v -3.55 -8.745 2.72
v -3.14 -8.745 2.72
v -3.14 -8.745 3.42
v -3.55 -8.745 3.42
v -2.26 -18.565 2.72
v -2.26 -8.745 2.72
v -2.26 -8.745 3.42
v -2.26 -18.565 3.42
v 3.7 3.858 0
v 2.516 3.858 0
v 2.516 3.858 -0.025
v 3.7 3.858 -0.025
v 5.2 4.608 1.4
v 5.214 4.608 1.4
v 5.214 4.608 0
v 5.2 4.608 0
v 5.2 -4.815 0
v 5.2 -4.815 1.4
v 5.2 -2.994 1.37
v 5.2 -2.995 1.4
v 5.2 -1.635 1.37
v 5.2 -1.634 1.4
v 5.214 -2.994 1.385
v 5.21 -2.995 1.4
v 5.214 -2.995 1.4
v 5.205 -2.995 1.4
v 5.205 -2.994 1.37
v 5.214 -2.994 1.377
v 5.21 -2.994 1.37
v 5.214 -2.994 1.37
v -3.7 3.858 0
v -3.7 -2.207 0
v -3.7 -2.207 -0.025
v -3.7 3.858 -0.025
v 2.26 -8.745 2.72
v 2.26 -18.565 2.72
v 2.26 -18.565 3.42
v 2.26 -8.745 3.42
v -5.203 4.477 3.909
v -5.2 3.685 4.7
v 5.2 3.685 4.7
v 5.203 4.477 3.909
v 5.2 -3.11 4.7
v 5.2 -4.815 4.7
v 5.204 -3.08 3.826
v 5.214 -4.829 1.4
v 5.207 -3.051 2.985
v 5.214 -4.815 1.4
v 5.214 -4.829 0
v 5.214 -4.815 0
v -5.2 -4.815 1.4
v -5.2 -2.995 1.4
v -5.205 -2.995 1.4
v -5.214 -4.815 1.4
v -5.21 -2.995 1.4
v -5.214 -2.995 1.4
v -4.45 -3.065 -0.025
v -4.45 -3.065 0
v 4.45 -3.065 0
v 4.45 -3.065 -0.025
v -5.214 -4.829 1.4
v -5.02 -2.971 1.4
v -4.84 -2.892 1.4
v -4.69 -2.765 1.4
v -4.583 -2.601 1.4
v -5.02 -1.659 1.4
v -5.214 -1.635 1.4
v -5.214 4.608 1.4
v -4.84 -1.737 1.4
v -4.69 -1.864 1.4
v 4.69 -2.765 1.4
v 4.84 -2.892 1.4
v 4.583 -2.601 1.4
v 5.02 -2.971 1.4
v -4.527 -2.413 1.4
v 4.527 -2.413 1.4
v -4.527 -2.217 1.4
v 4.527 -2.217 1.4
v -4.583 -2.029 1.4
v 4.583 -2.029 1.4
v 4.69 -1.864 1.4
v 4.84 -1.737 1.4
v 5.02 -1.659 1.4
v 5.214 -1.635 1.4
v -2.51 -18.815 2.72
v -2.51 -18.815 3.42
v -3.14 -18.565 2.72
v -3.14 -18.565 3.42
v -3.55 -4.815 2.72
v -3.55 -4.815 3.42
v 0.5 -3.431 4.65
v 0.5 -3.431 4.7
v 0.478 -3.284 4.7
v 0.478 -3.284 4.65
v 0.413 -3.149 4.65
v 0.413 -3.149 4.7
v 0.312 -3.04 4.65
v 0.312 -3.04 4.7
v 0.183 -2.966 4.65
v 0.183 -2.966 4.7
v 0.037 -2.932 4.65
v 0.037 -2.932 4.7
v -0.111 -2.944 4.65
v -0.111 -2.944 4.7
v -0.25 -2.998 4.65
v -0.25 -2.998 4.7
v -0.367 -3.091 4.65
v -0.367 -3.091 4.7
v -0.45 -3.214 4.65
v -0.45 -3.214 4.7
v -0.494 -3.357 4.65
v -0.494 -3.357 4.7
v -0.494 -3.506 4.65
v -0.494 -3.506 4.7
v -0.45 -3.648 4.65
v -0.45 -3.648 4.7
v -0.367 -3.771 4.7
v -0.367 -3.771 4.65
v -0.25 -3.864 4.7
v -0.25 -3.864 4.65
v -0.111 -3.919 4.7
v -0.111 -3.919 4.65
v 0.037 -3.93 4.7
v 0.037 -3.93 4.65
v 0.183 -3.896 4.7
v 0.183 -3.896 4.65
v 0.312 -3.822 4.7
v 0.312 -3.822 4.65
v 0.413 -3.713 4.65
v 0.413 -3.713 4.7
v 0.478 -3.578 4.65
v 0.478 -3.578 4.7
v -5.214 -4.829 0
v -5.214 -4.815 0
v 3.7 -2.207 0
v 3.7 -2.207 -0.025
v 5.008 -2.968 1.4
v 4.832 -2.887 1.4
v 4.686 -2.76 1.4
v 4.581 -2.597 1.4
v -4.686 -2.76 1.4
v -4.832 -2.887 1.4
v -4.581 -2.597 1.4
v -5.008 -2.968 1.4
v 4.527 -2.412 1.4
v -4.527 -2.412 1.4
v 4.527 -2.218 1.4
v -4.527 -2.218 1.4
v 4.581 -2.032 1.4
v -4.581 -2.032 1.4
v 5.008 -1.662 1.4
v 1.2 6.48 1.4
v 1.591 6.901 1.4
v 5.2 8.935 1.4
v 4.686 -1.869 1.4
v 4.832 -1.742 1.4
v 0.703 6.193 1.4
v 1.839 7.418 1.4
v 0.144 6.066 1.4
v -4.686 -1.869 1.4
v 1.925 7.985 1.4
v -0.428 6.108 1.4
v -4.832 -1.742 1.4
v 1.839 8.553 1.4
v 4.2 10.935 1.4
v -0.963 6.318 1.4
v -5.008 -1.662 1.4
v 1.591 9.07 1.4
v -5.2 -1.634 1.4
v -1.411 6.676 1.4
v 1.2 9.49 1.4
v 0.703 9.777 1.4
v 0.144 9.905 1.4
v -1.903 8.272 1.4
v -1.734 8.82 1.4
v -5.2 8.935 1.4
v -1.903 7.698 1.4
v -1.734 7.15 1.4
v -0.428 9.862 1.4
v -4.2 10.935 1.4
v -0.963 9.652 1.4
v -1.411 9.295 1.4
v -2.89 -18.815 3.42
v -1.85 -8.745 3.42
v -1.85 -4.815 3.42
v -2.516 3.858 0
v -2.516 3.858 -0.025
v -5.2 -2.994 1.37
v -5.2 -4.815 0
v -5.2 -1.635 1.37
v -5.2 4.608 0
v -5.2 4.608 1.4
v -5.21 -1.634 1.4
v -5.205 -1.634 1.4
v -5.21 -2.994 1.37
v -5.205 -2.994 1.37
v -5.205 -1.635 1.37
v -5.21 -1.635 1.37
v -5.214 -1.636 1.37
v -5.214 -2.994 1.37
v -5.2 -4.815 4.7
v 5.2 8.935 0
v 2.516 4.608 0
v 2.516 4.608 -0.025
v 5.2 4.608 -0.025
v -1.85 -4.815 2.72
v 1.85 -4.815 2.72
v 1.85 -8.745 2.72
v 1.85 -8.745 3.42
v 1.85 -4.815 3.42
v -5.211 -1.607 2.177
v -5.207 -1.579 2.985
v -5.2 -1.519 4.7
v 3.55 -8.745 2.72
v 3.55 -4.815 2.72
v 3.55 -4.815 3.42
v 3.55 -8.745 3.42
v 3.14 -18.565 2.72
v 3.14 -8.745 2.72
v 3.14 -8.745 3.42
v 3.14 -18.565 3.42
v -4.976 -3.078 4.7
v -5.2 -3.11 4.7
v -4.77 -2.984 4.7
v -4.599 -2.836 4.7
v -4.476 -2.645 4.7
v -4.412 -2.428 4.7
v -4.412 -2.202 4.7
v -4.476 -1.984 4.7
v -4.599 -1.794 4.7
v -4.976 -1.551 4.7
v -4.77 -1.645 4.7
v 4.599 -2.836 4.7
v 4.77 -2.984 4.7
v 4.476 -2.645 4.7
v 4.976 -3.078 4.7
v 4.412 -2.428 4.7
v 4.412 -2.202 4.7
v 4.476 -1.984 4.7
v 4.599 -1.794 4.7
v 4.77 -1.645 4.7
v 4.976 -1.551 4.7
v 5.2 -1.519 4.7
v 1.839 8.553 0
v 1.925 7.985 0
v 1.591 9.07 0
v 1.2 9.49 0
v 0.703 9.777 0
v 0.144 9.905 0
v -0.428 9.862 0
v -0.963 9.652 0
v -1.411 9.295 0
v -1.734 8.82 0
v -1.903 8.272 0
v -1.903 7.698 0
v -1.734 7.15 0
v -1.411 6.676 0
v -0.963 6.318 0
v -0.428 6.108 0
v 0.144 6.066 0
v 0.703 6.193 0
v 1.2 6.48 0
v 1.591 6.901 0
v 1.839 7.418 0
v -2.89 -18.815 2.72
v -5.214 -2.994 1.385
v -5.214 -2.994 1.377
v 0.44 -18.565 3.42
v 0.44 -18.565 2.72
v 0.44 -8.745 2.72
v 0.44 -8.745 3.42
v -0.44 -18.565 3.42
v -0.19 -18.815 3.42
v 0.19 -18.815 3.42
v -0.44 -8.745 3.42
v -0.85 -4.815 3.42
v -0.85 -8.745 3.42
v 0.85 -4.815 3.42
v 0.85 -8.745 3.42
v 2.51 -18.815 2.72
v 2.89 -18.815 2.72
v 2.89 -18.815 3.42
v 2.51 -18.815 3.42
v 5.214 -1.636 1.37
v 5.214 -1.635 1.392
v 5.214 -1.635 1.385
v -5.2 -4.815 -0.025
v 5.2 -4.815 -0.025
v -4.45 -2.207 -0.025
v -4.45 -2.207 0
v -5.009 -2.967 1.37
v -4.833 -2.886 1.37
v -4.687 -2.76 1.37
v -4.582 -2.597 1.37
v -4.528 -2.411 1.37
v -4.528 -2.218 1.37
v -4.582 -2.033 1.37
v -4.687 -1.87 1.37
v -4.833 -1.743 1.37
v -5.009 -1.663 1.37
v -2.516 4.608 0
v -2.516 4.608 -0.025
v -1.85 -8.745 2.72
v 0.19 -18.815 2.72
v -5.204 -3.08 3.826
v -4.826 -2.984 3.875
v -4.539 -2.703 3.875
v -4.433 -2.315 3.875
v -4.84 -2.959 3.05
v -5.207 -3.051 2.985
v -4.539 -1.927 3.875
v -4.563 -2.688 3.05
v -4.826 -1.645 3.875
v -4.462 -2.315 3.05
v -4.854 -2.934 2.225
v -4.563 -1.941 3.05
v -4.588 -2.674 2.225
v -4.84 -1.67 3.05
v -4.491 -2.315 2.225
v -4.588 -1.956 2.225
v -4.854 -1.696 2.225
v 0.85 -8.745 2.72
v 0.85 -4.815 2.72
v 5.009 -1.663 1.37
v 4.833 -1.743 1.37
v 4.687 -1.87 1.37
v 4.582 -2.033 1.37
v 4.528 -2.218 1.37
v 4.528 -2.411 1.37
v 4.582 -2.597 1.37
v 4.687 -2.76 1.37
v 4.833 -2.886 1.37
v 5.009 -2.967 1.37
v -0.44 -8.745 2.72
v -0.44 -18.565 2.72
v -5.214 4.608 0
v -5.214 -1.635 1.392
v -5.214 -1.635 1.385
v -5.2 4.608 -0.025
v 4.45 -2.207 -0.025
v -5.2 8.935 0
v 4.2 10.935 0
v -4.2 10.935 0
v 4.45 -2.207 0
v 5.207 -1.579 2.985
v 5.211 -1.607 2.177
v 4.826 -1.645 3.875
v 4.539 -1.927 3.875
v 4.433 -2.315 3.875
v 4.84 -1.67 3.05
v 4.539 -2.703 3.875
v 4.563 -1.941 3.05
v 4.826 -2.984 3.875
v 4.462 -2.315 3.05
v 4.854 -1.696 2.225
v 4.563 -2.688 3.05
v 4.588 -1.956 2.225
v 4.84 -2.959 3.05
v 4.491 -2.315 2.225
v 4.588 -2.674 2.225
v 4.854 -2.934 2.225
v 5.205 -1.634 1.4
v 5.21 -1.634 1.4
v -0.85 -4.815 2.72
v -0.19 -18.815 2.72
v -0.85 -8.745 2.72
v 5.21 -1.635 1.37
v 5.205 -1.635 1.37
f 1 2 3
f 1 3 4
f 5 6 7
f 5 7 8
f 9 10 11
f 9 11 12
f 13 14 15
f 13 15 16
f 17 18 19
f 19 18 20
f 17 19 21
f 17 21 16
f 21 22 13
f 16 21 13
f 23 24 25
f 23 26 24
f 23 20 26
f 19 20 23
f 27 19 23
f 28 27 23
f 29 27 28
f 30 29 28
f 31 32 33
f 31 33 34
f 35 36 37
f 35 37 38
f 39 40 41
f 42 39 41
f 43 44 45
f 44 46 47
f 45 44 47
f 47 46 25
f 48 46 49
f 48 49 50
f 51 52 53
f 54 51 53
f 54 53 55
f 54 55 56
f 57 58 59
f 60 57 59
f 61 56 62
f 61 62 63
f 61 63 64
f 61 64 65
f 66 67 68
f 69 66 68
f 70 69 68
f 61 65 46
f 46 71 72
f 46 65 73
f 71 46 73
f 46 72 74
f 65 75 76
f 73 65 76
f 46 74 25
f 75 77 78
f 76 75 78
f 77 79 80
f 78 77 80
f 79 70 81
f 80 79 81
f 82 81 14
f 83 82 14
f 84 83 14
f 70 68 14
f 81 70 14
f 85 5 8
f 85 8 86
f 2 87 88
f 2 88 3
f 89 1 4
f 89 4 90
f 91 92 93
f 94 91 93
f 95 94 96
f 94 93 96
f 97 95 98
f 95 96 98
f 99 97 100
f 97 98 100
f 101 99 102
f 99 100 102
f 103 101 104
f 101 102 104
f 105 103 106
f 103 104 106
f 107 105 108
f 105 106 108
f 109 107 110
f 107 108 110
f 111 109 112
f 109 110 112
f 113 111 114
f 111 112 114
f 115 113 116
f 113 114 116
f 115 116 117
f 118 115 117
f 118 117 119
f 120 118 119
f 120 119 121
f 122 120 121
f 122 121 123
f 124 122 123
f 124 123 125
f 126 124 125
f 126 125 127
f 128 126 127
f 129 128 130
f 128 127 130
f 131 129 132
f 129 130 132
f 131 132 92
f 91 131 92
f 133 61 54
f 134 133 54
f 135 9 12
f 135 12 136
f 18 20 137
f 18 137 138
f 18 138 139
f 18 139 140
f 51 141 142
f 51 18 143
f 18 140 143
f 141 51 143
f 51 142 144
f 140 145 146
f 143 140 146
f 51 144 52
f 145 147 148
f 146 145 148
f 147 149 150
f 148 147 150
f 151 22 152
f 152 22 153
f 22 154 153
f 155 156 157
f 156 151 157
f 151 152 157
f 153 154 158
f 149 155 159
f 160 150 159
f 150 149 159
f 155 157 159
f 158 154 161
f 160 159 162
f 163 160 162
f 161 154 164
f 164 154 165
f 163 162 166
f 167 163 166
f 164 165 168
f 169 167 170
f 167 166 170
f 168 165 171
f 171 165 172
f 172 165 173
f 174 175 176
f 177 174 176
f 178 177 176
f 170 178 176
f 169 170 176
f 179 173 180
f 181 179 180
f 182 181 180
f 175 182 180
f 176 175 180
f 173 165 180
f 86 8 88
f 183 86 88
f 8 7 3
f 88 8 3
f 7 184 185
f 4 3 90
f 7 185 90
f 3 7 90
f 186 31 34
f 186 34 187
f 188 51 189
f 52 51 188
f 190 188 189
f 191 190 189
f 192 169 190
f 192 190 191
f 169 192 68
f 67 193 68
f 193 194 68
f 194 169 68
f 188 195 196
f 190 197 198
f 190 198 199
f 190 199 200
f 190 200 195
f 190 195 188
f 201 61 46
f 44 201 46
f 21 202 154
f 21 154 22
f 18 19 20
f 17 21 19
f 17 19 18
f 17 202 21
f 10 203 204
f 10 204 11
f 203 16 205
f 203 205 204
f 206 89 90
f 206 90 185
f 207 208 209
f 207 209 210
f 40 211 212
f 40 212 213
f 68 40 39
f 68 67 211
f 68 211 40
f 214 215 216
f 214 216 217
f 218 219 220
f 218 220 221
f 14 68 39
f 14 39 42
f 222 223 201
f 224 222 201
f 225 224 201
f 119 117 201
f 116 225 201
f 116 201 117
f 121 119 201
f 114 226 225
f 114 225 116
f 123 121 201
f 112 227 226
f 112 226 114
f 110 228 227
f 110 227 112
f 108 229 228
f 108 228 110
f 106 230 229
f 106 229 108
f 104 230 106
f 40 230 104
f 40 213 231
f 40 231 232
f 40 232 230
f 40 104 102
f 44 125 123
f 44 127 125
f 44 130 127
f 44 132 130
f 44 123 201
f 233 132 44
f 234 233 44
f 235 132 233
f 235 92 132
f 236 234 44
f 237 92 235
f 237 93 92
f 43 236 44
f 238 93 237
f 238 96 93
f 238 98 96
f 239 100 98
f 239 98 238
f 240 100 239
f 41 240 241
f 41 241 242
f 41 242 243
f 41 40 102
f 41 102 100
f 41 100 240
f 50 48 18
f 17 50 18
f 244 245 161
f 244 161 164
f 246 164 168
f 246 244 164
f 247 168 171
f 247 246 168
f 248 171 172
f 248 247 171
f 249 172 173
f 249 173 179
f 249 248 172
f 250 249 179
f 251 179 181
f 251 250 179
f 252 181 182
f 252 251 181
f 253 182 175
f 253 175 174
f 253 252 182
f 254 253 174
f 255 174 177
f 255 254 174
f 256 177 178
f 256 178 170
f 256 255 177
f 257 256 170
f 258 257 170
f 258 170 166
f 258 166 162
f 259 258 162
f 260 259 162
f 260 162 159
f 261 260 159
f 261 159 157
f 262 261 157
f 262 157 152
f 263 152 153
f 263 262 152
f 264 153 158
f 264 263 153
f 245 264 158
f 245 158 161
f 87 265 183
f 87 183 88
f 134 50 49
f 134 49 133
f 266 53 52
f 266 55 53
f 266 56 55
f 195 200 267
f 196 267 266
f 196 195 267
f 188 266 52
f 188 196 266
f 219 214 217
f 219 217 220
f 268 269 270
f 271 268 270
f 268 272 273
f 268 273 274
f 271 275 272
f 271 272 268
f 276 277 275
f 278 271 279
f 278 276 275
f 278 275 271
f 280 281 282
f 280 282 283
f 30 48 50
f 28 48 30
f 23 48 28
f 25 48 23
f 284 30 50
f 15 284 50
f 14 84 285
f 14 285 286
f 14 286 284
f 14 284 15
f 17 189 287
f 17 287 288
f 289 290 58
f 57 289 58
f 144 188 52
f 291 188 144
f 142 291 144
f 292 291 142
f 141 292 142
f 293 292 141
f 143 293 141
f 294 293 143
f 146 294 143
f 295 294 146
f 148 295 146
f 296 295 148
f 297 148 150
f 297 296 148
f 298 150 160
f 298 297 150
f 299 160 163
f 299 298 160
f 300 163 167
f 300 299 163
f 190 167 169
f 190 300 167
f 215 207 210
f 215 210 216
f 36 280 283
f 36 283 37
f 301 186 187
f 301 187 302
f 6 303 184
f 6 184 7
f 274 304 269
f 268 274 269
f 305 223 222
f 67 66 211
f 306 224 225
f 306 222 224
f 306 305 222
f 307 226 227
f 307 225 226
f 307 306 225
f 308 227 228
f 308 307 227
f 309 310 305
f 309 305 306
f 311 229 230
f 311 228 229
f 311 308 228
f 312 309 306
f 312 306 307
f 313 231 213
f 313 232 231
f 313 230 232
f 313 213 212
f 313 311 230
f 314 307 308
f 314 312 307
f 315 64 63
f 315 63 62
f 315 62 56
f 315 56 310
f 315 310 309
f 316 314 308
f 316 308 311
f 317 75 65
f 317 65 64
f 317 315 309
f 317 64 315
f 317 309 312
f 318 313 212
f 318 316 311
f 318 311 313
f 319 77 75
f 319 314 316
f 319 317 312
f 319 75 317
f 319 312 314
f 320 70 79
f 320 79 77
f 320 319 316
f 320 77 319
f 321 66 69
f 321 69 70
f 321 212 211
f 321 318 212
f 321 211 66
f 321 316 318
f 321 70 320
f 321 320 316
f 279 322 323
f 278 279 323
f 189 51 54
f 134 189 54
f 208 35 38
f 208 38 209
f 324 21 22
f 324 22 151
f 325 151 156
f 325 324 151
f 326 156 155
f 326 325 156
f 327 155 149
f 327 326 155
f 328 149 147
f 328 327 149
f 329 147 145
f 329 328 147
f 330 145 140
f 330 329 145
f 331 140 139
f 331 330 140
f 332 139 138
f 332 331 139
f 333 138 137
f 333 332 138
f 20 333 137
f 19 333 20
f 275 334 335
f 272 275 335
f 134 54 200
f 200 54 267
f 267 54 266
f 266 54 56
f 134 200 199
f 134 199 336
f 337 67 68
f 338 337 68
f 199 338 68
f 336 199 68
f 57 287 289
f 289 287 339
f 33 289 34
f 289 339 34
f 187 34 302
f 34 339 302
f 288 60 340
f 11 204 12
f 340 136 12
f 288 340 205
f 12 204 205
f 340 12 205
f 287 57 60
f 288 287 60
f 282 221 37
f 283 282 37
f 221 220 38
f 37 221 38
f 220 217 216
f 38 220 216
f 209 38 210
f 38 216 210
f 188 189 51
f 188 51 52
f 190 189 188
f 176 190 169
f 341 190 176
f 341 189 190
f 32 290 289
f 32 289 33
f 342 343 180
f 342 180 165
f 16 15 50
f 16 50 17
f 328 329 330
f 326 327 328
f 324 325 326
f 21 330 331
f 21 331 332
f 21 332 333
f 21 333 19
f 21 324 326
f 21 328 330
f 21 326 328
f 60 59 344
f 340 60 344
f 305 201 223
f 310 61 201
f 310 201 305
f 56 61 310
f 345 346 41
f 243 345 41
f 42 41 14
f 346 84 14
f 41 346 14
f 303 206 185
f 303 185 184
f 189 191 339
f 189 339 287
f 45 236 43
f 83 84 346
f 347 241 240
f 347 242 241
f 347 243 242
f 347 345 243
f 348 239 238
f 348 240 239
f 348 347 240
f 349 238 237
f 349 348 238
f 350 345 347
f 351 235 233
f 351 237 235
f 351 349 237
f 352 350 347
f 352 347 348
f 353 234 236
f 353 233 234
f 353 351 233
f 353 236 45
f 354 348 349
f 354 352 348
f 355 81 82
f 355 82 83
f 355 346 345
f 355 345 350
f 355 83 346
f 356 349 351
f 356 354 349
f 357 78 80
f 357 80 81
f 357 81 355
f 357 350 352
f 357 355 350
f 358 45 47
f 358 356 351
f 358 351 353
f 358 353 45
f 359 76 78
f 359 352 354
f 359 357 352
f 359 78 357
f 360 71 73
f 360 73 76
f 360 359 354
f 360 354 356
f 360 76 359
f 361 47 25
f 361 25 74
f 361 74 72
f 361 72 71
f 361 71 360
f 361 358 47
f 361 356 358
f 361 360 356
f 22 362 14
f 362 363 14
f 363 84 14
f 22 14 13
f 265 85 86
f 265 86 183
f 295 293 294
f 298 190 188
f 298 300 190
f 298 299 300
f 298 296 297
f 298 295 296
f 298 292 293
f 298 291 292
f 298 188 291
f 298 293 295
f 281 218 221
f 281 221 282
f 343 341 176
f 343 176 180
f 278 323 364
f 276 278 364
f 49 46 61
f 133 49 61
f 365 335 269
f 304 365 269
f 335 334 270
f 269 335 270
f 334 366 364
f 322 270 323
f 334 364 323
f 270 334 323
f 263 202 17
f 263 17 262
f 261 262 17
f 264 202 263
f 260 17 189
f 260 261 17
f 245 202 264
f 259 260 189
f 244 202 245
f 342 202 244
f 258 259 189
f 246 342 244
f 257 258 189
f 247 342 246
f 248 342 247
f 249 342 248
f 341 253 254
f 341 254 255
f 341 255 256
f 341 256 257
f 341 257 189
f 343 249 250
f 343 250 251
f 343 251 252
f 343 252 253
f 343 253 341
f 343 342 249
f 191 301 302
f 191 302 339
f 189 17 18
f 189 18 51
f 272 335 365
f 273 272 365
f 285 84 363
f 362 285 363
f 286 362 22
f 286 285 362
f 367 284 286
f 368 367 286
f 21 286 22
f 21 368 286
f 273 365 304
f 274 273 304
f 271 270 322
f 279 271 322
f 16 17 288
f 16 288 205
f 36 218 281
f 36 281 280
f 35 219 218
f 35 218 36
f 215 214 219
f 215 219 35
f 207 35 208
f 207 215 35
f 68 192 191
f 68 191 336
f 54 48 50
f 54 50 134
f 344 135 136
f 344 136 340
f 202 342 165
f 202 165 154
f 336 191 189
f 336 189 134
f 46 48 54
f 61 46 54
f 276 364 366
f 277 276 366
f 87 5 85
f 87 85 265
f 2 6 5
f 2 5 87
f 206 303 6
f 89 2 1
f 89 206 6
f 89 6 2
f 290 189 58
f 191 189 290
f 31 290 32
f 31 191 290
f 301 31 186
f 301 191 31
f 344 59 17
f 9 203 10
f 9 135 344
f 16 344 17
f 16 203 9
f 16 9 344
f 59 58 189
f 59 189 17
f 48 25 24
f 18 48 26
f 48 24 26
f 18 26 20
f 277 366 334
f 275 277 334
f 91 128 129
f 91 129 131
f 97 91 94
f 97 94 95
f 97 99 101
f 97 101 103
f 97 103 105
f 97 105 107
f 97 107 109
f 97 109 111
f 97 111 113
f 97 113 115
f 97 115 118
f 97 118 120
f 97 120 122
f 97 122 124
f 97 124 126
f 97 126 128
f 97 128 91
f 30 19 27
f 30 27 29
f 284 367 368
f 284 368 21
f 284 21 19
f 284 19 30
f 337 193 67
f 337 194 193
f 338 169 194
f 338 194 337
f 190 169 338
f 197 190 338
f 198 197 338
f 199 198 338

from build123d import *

# Parameters (mm, degrees)
SKETCH1_R             = 1.925
BOSS_EXTRUDE1_DEPTH   = 1.4
SKETCH2_W             = 10.4
SKETCH2_H             = 9.25
BOSS_EXTRUDE2_DEPTH   = 3.3
CHAMFER1_SIZE         = 0.75
DRAFT7_ANGLE          = 3
DRAFT8_ANGLE          = 0.25
SKETCH4_W             = 0.014399058
SKETCH4_H             = 9.422945672
BOSS_EXTRUDE4_DEPTH   = 1.4
BOSS_EXTRUDE4_2_DEPTH = 1.4
SKETCH5_R             = 0.795641545
CUT_EXTRUDE1_DEPTH    = 3.33
CUT_EXTRUDE1_TAPER    = 2
BOSS_EXTRUDE6_DEPTH   = 0.025
BOSS_EXTRUDE7_DEPTH   = 0.7
BOSS_EXTRUDE7_2_DEPTH = 0.7
BOSS_EXTRUDE7_3_DEPTH = 0.7
DRAFT16_ANGLE         = 0.25
SKETCH16_W            = 10.428798116
SKETCH16_H            = 0.014399058
BOSS_EXTRUDE8_DEPTH   = 1.4
SKETCH17_R            = 0.5
CUT_EXTRUDE2_DEPTH    = 0.05


with BuildPart() as part:
    # Sketch1 → Boss-Extrude1 (new body)
    with BuildSketch(Plane.XY):
        Polygon((-5.2, 8.935228045), (-4.2, 10.935228045), (4.2, 10.935228045), (5.2, 8.935228045), (5.2, -4.814771955), (-5.2, -4.814771955), align=None)
        with Locations((0, 7.985228045)):
            Circle(SKETCH1_R, mode=Mode.SUBTRACT)
    extrude(amount=BOSS_EXTRUDE1_DEPTH)


with BuildPart() as body_2:
    # Sketch2 → Boss-Extrude2 (new body)
    with BuildSketch(Plane.XY.offset(1.4)):
        with Locations((0, -0.189771955)):
            Rectangle(SKETCH2_W, SKETCH2_H)
    extrude(amount=BOSS_EXTRUDE2_DEPTH)

    # Chamfer1
    chamfer1_edges = [body_2.edges().sort_by_distance(p)[0] for p in [
        (0, 4.435228045, 4.7),
    ]]
    chamfer(chamfer1_edges, length=CHAMFER1_SIZE)

    # Draft7
    draft7_faces = [body_2.faces().sort_by_distance(p)[0] for p in [
        (0, 4.435228045, 2.675),
    ]]
    draft(draft7_faces, Plane.XY.offset(4.7), DRAFT7_ANGLE)

    # Draft8
    draft8_faces = [body_2.faces().sort_by_distance(p)[0] for p in [
        (5.2, -0.188670245, 3.031373156),
        (-5.2, -0.188670245, 3.031373156),
    ]]
    draft(draft8_faces, Plane.XY.offset(4.7), DRAFT8_ANGLE)


with BuildPart() as body_3:
    # Sketch4 → Boss-Extrude4 (new body)
    with BuildSketch(Plane(origin=(0, 0, 1.4), x_dir=(-1, 0, 0), z_dir=(0, 0, -1))):
        with Locations((-5.207199529, -0.103299119)):
            Rectangle(SKETCH4_W, SKETCH4_H)
    extrude(amount=BOSS_EXTRUDE4_DEPTH)


with BuildPart() as body_4:
    # Sketch4 → Boss-Extrude4 2 (new body)
    with BuildSketch(Plane(origin=(0, 0, 1.4), x_dir=(-1, 0, 0), z_dir=(0, 0, -1))):
        with Locations((5.207199529, -0.103299119)):
            Rectangle(SKETCH4_W, SKETCH4_H)
    extrude(amount=BOSS_EXTRUDE4_2_DEPTH)


with BuildPart() as cut_extrude1_tool:
    # Sketch5 → Cut-Extrude1 (new body)
    with BuildSketch(Plane.XY.offset(4.7)):
        with Locations((-5.2, -2.314771955)):
            Circle(SKETCH5_R)
        with Locations((5.2, -2.314771955)):
            Circle(SKETCH5_R)
    extrude(amount=-CUT_EXTRUDE1_DEPTH, taper=CUT_EXTRUDE1_TAPER)


with BuildPart() as part_1:
    add(part.part)

    # Cut-Extrude1: cut by cut_extrude1_tool
    add(cut_extrude1_tool.part, mode=Mode.SUBTRACT)


with BuildPart() as body_2_1:
    add(body_2.part)

    # Cut-Extrude1: cut by cut_extrude1_tool
    add(cut_extrude1_tool.part, mode=Mode.SUBTRACT)

    # Draft16
    draft16_faces = [body_2_1.faces().sort_by_distance(p)[0] for p in [
        (0, -4.814771955, 3.049239564),
    ]]
    draft(draft16_faces, Plane.XY.offset(4.7), DRAFT16_ANGLE)

    # Sketch17 → Cut-Extrude2 (cut)
    with BuildSketch(Plane.XY.offset(4.7)):
        with Locations((0, -3.431055698)):
            Circle(SKETCH17_R)
    extrude(amount=-CUT_EXTRUDE2_DEPTH, mode=Mode.SUBTRACT)


with BuildPart() as body_3_1:
    add(body_3.part)

    # Cut-Extrude1: cut by cut_extrude1_tool
    add(cut_extrude1_tool.part, mode=Mode.SUBTRACT)


with BuildPart() as body_4_1:
    add(body_4.part)

    # Cut-Extrude1: cut by cut_extrude1_tool
    add(cut_extrude1_tool.part, mode=Mode.SUBTRACT)


with BuildPart() as body_5:
    # Sketch6 → Boss-Extrude6 (new body)
    with BuildSketch(Plane(origin=(0, 0, 0), x_dir=(-1, 0, 0), z_dir=(0, 0, -1))):
        Polygon((-5.2, 4.608173717), (-2.516415683, 4.608173717), (-2.516415683, 3.858173717), (-3.7, 3.858173717), (-3.7, -2.207251306), (-4.45, -2.207251306), (-4.45, -3.039821774), (-4.45, -3.064771955), (-4.310560576, -3.064771955), (4.310560576, -3.064771955), (4.45, -3.064771955), (4.45, -3.039821774), (4.45, -2.207251306), (3.7, -2.207251306), (3.7, 3.858173717), (2.516415683, 3.858173717), (2.516415683, 4.608173717), (5.2, 4.608173717), (5.2, -4.814771955), (-5.2, -4.814771955), align=None)
    extrude(amount=BOSS_EXTRUDE6_DEPTH)


with BuildPart() as body_6:
    # Sketch10 → Boss-Extrude7 (new body)
    with BuildSketch(Plane(origin=(0, 0, 2.72), x_dir=(-1, 0, 0), z_dir=(0, 0, -1))):
        Polygon((-0.85, -4.814771955), (0.85, -4.814771955), (0.85, -8.744771955), (0.44, -8.744771955), (0.44, -18.564771955), (0.19, -18.814771955), (-0.19, -18.814771955), (-0.44, -18.564771955), (-0.44, -8.744771955), (-0.85, -8.744771955), align=None)
    extrude(amount=-BOSS_EXTRUDE7_DEPTH)


with BuildPart() as body_7:
    # Sketch10 → Boss-Extrude7 2 (new body)
    with BuildSketch(Plane(origin=(0, 0, 2.72), x_dir=(-1, 0, 0), z_dir=(0, 0, -1))):
        Polygon((1.85, -4.814771955), (1.85, -8.744771955), (2.26, -8.744771955), (2.26, -18.564771955), (2.51, -18.814771955), (2.89, -18.814771955), (3.14, -18.564771955), (3.14, -8.744771955), (3.55, -8.744771955), (3.55, -4.814771955), align=None)
    extrude(amount=-BOSS_EXTRUDE7_2_DEPTH)


with BuildPart() as body_8:
    # Sketch10 → Boss-Extrude7 3 (new body)
    with BuildSketch(Plane(origin=(0, 0, 2.72), x_dir=(-1, 0, 0), z_dir=(0, 0, -1))):
        Polygon((-3.55, -4.814771955), (-3.55, -8.744771955), (-3.14, -8.744771955), (-3.14, -18.564771955), (-2.89, -18.814771955), (-2.51, -18.814771955), (-2.26, -18.564771955), (-2.26, -8.744771955), (-1.85, -8.744771955), (-1.85, -4.814771955), align=None)
    extrude(amount=-BOSS_EXTRUDE7_3_DEPTH)


with BuildPart() as body_9:
    # Sketch16 → Boss-Extrude8 (new body)
    with BuildSketch(Plane(origin=(0, 0, 1.4), x_dir=(-1, 0, 0), z_dir=(0, 0, -1))):
        with Locations((0, -4.821971484)):
            Rectangle(SKETCH16_W, SKETCH16_H)
    extrude(amount=BOSS_EXTRUDE8_DEPTH)


solid = Compound([part_1.part, body_2_1.part, body_3_1.part, body_4_1.part, body_5.part, body_6.part, body_7.part, body_8.part, body_9.part])
